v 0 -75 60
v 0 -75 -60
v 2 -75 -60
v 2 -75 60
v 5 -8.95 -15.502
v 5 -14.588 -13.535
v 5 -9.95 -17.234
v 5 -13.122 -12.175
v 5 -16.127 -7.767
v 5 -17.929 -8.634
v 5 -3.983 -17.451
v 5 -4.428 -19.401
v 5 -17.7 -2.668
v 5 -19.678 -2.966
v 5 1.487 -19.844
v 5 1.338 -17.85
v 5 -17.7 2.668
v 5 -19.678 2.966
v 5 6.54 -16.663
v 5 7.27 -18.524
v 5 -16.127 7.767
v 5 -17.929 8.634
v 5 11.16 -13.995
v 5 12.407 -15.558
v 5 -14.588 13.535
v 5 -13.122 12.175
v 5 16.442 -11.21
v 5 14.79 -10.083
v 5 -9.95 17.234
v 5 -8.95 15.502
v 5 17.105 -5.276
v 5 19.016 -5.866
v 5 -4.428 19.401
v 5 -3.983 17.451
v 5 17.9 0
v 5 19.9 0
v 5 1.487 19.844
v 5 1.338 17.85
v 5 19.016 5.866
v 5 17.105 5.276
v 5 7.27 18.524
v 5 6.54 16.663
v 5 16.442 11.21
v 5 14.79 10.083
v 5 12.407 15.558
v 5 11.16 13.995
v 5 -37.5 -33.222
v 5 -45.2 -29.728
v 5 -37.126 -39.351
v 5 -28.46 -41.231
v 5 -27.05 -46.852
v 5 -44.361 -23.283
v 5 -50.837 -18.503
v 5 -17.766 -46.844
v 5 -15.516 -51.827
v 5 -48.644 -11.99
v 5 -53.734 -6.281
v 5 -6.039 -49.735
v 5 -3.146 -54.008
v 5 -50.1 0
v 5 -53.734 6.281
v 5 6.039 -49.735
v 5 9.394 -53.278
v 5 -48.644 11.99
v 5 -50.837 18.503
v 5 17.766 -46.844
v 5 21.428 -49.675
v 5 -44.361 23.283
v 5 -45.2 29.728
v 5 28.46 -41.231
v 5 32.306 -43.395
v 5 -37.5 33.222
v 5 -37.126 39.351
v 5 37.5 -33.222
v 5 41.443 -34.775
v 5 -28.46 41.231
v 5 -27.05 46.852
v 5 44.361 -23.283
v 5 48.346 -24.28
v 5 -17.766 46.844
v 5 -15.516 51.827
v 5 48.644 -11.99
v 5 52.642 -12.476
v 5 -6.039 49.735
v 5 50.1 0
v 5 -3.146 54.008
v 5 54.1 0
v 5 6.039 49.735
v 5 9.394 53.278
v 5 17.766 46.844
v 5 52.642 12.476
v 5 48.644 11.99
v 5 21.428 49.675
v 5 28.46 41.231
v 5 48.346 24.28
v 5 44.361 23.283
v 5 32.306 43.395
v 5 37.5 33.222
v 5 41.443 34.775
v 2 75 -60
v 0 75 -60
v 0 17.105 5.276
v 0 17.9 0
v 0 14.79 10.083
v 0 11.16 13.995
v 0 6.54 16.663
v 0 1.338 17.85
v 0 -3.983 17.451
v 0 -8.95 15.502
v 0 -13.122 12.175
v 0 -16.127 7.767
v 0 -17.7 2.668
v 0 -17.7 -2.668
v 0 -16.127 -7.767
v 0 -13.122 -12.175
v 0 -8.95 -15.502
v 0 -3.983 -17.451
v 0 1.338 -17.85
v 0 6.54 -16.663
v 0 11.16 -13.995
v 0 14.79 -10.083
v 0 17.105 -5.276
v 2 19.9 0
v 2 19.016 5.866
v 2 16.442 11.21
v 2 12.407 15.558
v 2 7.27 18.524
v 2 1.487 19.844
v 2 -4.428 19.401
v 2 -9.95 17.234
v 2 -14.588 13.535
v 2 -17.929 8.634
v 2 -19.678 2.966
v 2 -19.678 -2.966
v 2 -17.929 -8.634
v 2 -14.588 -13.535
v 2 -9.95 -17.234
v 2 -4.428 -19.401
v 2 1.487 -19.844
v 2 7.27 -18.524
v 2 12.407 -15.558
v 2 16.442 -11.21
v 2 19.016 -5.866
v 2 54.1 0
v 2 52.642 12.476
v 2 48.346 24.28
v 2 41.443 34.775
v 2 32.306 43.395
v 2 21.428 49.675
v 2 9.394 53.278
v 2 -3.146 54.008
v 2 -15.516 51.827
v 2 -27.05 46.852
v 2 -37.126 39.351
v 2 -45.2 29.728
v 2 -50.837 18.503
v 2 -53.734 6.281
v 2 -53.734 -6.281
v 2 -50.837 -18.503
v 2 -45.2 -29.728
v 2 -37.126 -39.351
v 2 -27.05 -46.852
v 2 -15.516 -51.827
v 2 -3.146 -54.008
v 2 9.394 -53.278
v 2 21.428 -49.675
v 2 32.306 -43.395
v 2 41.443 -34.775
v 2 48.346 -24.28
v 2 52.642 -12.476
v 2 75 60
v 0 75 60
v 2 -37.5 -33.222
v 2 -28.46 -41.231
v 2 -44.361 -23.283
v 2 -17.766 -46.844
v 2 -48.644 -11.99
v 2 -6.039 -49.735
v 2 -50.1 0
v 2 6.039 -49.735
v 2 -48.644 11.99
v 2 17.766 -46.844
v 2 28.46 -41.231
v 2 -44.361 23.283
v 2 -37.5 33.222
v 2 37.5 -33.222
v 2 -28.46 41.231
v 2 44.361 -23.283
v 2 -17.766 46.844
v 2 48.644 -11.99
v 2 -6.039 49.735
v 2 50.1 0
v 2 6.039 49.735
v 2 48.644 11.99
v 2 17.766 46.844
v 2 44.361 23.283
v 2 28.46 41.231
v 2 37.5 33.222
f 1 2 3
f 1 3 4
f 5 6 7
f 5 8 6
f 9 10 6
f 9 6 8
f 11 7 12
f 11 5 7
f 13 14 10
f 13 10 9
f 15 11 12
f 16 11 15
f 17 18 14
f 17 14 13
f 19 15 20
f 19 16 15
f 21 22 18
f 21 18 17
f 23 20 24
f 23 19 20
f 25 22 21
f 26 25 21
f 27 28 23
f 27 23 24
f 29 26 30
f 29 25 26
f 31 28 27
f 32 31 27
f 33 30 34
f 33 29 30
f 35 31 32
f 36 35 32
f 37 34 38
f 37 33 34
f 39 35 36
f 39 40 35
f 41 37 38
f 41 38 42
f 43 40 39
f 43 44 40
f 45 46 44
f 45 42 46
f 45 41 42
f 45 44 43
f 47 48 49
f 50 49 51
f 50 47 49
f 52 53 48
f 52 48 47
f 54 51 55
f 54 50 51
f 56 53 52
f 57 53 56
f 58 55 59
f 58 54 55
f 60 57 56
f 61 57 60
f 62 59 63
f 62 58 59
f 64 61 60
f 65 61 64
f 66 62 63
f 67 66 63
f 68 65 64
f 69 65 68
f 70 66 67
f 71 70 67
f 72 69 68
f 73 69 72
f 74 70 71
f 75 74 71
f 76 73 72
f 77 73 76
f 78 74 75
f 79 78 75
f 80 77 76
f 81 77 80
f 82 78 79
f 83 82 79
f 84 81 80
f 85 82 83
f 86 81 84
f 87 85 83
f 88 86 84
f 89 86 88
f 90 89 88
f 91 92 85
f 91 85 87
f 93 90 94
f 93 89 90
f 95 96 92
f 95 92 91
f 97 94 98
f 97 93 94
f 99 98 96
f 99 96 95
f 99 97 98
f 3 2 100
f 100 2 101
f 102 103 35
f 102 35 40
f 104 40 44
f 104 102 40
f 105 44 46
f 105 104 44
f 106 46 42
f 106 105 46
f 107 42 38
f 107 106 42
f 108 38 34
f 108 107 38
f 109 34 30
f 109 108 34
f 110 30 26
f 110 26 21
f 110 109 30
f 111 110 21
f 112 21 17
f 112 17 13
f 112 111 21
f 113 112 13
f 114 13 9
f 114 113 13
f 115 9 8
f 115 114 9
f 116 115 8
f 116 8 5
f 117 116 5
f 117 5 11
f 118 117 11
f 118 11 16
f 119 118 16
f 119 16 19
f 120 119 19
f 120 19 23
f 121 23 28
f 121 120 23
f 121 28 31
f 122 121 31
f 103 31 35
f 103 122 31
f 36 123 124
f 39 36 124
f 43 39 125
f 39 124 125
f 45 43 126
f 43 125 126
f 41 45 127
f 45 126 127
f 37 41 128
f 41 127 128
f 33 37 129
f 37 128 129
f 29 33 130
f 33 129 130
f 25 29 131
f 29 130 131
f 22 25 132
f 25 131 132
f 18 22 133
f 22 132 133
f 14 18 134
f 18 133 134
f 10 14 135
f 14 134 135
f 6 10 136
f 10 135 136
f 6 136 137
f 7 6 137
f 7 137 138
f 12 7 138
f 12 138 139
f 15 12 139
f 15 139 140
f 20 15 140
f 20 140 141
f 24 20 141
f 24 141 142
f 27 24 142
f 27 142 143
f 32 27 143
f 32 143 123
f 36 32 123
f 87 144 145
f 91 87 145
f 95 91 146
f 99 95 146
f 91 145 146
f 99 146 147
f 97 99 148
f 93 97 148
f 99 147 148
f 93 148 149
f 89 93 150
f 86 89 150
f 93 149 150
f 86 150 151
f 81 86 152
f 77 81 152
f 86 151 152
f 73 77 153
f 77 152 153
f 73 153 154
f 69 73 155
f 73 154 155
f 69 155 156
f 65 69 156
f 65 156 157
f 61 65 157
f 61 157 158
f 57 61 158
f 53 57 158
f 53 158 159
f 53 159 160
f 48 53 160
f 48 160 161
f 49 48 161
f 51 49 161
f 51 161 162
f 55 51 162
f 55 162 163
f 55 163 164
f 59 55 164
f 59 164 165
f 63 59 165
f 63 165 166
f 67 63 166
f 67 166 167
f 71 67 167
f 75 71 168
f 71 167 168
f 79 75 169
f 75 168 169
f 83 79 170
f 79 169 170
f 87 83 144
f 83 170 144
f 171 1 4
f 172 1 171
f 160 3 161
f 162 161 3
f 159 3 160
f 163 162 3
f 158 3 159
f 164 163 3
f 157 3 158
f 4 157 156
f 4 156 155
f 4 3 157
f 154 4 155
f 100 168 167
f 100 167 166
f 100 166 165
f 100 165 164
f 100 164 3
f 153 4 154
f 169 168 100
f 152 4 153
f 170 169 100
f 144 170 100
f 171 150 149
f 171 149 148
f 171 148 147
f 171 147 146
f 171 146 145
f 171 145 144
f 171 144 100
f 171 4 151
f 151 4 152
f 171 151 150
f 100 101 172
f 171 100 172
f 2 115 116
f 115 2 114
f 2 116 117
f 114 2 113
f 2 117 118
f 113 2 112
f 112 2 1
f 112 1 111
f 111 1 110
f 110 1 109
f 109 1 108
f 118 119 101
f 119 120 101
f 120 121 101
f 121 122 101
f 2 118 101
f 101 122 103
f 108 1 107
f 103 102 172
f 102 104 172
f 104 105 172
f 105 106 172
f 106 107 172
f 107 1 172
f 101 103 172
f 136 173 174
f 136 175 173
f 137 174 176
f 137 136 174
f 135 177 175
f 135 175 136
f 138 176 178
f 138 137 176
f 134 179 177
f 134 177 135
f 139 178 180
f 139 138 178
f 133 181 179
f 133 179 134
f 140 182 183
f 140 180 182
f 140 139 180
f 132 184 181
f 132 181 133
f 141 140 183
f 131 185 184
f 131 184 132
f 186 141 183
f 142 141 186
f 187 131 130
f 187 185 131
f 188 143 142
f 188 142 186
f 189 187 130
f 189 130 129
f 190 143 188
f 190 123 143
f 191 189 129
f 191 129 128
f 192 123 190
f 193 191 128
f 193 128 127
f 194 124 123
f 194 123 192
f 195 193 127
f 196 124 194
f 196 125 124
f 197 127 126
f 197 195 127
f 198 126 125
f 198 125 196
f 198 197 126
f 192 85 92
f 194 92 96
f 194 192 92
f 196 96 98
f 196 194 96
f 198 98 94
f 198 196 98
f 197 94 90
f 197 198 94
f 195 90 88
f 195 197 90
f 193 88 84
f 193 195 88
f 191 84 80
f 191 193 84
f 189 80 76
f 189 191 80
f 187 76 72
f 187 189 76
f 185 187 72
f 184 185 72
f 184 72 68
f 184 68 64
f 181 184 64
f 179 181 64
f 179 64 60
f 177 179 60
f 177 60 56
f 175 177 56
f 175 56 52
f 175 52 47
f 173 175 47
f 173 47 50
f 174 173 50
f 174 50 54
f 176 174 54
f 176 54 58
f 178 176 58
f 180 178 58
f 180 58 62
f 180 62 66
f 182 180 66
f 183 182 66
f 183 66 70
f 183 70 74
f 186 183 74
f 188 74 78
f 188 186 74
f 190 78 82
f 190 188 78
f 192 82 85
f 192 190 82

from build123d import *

# Parameters (mm, degrees)
SKETCH012_W   = 150
SKETCH012_H   = 120
SKETCH012_R   = 19.9
PAD004_DEPTH  = 2
SKETCH013_R   = 19.9
SKETCH013_R_2 = 17.9
PAD005_DEPTH  = 5
SKETCH014_R   = 54.1
SKETCH014_R_2 = 50.1
PAD006_DEPTH  = 5


with BuildPart() as part:
    # Sketch012 → Pad004 (new body)
    with BuildSketch(Plane.YZ):
        Rectangle(SKETCH012_W, SKETCH012_H)
        Circle(SKETCH012_R, mode=Mode.SUBTRACT)
    extrude(amount=PAD004_DEPTH)

    # Sketch013 → Pad005 (join)
    with BuildSketch(Plane.YZ):
        Circle(SKETCH013_R)
        Circle(SKETCH013_R_2, mode=Mode.SUBTRACT)
    extrude(amount=PAD005_DEPTH)

    # Sketch014 → Pad006 (join)
    with BuildSketch(Plane.YZ):
        Circle(SKETCH014_R)
        Circle(SKETCH014_R_2, mode=Mode.SUBTRACT)
    extrude(amount=PAD006_DEPTH)


solid = part.part
